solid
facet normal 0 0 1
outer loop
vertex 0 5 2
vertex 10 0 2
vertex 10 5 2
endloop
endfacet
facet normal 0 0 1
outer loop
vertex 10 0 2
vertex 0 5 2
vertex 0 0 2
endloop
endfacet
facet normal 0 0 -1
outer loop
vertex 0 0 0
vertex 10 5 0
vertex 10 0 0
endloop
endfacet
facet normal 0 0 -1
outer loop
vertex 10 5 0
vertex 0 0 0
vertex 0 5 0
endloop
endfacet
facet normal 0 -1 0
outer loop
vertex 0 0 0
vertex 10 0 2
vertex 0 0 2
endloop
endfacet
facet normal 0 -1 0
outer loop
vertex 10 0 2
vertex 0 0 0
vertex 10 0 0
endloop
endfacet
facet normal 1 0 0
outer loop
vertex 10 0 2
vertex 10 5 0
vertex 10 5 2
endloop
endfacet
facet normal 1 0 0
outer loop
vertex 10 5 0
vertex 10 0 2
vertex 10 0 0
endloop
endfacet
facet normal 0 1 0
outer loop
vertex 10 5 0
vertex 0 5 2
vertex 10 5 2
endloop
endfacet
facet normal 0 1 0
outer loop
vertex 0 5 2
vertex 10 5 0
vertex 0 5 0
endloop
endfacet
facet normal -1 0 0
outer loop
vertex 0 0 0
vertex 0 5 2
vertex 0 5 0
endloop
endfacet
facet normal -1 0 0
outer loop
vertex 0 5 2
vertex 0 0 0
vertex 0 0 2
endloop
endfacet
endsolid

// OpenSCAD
module rectangular_prism(width, depth, height) {
  cube([width, depth, height]);
}

rectangular_prism(10, 5, 2);
